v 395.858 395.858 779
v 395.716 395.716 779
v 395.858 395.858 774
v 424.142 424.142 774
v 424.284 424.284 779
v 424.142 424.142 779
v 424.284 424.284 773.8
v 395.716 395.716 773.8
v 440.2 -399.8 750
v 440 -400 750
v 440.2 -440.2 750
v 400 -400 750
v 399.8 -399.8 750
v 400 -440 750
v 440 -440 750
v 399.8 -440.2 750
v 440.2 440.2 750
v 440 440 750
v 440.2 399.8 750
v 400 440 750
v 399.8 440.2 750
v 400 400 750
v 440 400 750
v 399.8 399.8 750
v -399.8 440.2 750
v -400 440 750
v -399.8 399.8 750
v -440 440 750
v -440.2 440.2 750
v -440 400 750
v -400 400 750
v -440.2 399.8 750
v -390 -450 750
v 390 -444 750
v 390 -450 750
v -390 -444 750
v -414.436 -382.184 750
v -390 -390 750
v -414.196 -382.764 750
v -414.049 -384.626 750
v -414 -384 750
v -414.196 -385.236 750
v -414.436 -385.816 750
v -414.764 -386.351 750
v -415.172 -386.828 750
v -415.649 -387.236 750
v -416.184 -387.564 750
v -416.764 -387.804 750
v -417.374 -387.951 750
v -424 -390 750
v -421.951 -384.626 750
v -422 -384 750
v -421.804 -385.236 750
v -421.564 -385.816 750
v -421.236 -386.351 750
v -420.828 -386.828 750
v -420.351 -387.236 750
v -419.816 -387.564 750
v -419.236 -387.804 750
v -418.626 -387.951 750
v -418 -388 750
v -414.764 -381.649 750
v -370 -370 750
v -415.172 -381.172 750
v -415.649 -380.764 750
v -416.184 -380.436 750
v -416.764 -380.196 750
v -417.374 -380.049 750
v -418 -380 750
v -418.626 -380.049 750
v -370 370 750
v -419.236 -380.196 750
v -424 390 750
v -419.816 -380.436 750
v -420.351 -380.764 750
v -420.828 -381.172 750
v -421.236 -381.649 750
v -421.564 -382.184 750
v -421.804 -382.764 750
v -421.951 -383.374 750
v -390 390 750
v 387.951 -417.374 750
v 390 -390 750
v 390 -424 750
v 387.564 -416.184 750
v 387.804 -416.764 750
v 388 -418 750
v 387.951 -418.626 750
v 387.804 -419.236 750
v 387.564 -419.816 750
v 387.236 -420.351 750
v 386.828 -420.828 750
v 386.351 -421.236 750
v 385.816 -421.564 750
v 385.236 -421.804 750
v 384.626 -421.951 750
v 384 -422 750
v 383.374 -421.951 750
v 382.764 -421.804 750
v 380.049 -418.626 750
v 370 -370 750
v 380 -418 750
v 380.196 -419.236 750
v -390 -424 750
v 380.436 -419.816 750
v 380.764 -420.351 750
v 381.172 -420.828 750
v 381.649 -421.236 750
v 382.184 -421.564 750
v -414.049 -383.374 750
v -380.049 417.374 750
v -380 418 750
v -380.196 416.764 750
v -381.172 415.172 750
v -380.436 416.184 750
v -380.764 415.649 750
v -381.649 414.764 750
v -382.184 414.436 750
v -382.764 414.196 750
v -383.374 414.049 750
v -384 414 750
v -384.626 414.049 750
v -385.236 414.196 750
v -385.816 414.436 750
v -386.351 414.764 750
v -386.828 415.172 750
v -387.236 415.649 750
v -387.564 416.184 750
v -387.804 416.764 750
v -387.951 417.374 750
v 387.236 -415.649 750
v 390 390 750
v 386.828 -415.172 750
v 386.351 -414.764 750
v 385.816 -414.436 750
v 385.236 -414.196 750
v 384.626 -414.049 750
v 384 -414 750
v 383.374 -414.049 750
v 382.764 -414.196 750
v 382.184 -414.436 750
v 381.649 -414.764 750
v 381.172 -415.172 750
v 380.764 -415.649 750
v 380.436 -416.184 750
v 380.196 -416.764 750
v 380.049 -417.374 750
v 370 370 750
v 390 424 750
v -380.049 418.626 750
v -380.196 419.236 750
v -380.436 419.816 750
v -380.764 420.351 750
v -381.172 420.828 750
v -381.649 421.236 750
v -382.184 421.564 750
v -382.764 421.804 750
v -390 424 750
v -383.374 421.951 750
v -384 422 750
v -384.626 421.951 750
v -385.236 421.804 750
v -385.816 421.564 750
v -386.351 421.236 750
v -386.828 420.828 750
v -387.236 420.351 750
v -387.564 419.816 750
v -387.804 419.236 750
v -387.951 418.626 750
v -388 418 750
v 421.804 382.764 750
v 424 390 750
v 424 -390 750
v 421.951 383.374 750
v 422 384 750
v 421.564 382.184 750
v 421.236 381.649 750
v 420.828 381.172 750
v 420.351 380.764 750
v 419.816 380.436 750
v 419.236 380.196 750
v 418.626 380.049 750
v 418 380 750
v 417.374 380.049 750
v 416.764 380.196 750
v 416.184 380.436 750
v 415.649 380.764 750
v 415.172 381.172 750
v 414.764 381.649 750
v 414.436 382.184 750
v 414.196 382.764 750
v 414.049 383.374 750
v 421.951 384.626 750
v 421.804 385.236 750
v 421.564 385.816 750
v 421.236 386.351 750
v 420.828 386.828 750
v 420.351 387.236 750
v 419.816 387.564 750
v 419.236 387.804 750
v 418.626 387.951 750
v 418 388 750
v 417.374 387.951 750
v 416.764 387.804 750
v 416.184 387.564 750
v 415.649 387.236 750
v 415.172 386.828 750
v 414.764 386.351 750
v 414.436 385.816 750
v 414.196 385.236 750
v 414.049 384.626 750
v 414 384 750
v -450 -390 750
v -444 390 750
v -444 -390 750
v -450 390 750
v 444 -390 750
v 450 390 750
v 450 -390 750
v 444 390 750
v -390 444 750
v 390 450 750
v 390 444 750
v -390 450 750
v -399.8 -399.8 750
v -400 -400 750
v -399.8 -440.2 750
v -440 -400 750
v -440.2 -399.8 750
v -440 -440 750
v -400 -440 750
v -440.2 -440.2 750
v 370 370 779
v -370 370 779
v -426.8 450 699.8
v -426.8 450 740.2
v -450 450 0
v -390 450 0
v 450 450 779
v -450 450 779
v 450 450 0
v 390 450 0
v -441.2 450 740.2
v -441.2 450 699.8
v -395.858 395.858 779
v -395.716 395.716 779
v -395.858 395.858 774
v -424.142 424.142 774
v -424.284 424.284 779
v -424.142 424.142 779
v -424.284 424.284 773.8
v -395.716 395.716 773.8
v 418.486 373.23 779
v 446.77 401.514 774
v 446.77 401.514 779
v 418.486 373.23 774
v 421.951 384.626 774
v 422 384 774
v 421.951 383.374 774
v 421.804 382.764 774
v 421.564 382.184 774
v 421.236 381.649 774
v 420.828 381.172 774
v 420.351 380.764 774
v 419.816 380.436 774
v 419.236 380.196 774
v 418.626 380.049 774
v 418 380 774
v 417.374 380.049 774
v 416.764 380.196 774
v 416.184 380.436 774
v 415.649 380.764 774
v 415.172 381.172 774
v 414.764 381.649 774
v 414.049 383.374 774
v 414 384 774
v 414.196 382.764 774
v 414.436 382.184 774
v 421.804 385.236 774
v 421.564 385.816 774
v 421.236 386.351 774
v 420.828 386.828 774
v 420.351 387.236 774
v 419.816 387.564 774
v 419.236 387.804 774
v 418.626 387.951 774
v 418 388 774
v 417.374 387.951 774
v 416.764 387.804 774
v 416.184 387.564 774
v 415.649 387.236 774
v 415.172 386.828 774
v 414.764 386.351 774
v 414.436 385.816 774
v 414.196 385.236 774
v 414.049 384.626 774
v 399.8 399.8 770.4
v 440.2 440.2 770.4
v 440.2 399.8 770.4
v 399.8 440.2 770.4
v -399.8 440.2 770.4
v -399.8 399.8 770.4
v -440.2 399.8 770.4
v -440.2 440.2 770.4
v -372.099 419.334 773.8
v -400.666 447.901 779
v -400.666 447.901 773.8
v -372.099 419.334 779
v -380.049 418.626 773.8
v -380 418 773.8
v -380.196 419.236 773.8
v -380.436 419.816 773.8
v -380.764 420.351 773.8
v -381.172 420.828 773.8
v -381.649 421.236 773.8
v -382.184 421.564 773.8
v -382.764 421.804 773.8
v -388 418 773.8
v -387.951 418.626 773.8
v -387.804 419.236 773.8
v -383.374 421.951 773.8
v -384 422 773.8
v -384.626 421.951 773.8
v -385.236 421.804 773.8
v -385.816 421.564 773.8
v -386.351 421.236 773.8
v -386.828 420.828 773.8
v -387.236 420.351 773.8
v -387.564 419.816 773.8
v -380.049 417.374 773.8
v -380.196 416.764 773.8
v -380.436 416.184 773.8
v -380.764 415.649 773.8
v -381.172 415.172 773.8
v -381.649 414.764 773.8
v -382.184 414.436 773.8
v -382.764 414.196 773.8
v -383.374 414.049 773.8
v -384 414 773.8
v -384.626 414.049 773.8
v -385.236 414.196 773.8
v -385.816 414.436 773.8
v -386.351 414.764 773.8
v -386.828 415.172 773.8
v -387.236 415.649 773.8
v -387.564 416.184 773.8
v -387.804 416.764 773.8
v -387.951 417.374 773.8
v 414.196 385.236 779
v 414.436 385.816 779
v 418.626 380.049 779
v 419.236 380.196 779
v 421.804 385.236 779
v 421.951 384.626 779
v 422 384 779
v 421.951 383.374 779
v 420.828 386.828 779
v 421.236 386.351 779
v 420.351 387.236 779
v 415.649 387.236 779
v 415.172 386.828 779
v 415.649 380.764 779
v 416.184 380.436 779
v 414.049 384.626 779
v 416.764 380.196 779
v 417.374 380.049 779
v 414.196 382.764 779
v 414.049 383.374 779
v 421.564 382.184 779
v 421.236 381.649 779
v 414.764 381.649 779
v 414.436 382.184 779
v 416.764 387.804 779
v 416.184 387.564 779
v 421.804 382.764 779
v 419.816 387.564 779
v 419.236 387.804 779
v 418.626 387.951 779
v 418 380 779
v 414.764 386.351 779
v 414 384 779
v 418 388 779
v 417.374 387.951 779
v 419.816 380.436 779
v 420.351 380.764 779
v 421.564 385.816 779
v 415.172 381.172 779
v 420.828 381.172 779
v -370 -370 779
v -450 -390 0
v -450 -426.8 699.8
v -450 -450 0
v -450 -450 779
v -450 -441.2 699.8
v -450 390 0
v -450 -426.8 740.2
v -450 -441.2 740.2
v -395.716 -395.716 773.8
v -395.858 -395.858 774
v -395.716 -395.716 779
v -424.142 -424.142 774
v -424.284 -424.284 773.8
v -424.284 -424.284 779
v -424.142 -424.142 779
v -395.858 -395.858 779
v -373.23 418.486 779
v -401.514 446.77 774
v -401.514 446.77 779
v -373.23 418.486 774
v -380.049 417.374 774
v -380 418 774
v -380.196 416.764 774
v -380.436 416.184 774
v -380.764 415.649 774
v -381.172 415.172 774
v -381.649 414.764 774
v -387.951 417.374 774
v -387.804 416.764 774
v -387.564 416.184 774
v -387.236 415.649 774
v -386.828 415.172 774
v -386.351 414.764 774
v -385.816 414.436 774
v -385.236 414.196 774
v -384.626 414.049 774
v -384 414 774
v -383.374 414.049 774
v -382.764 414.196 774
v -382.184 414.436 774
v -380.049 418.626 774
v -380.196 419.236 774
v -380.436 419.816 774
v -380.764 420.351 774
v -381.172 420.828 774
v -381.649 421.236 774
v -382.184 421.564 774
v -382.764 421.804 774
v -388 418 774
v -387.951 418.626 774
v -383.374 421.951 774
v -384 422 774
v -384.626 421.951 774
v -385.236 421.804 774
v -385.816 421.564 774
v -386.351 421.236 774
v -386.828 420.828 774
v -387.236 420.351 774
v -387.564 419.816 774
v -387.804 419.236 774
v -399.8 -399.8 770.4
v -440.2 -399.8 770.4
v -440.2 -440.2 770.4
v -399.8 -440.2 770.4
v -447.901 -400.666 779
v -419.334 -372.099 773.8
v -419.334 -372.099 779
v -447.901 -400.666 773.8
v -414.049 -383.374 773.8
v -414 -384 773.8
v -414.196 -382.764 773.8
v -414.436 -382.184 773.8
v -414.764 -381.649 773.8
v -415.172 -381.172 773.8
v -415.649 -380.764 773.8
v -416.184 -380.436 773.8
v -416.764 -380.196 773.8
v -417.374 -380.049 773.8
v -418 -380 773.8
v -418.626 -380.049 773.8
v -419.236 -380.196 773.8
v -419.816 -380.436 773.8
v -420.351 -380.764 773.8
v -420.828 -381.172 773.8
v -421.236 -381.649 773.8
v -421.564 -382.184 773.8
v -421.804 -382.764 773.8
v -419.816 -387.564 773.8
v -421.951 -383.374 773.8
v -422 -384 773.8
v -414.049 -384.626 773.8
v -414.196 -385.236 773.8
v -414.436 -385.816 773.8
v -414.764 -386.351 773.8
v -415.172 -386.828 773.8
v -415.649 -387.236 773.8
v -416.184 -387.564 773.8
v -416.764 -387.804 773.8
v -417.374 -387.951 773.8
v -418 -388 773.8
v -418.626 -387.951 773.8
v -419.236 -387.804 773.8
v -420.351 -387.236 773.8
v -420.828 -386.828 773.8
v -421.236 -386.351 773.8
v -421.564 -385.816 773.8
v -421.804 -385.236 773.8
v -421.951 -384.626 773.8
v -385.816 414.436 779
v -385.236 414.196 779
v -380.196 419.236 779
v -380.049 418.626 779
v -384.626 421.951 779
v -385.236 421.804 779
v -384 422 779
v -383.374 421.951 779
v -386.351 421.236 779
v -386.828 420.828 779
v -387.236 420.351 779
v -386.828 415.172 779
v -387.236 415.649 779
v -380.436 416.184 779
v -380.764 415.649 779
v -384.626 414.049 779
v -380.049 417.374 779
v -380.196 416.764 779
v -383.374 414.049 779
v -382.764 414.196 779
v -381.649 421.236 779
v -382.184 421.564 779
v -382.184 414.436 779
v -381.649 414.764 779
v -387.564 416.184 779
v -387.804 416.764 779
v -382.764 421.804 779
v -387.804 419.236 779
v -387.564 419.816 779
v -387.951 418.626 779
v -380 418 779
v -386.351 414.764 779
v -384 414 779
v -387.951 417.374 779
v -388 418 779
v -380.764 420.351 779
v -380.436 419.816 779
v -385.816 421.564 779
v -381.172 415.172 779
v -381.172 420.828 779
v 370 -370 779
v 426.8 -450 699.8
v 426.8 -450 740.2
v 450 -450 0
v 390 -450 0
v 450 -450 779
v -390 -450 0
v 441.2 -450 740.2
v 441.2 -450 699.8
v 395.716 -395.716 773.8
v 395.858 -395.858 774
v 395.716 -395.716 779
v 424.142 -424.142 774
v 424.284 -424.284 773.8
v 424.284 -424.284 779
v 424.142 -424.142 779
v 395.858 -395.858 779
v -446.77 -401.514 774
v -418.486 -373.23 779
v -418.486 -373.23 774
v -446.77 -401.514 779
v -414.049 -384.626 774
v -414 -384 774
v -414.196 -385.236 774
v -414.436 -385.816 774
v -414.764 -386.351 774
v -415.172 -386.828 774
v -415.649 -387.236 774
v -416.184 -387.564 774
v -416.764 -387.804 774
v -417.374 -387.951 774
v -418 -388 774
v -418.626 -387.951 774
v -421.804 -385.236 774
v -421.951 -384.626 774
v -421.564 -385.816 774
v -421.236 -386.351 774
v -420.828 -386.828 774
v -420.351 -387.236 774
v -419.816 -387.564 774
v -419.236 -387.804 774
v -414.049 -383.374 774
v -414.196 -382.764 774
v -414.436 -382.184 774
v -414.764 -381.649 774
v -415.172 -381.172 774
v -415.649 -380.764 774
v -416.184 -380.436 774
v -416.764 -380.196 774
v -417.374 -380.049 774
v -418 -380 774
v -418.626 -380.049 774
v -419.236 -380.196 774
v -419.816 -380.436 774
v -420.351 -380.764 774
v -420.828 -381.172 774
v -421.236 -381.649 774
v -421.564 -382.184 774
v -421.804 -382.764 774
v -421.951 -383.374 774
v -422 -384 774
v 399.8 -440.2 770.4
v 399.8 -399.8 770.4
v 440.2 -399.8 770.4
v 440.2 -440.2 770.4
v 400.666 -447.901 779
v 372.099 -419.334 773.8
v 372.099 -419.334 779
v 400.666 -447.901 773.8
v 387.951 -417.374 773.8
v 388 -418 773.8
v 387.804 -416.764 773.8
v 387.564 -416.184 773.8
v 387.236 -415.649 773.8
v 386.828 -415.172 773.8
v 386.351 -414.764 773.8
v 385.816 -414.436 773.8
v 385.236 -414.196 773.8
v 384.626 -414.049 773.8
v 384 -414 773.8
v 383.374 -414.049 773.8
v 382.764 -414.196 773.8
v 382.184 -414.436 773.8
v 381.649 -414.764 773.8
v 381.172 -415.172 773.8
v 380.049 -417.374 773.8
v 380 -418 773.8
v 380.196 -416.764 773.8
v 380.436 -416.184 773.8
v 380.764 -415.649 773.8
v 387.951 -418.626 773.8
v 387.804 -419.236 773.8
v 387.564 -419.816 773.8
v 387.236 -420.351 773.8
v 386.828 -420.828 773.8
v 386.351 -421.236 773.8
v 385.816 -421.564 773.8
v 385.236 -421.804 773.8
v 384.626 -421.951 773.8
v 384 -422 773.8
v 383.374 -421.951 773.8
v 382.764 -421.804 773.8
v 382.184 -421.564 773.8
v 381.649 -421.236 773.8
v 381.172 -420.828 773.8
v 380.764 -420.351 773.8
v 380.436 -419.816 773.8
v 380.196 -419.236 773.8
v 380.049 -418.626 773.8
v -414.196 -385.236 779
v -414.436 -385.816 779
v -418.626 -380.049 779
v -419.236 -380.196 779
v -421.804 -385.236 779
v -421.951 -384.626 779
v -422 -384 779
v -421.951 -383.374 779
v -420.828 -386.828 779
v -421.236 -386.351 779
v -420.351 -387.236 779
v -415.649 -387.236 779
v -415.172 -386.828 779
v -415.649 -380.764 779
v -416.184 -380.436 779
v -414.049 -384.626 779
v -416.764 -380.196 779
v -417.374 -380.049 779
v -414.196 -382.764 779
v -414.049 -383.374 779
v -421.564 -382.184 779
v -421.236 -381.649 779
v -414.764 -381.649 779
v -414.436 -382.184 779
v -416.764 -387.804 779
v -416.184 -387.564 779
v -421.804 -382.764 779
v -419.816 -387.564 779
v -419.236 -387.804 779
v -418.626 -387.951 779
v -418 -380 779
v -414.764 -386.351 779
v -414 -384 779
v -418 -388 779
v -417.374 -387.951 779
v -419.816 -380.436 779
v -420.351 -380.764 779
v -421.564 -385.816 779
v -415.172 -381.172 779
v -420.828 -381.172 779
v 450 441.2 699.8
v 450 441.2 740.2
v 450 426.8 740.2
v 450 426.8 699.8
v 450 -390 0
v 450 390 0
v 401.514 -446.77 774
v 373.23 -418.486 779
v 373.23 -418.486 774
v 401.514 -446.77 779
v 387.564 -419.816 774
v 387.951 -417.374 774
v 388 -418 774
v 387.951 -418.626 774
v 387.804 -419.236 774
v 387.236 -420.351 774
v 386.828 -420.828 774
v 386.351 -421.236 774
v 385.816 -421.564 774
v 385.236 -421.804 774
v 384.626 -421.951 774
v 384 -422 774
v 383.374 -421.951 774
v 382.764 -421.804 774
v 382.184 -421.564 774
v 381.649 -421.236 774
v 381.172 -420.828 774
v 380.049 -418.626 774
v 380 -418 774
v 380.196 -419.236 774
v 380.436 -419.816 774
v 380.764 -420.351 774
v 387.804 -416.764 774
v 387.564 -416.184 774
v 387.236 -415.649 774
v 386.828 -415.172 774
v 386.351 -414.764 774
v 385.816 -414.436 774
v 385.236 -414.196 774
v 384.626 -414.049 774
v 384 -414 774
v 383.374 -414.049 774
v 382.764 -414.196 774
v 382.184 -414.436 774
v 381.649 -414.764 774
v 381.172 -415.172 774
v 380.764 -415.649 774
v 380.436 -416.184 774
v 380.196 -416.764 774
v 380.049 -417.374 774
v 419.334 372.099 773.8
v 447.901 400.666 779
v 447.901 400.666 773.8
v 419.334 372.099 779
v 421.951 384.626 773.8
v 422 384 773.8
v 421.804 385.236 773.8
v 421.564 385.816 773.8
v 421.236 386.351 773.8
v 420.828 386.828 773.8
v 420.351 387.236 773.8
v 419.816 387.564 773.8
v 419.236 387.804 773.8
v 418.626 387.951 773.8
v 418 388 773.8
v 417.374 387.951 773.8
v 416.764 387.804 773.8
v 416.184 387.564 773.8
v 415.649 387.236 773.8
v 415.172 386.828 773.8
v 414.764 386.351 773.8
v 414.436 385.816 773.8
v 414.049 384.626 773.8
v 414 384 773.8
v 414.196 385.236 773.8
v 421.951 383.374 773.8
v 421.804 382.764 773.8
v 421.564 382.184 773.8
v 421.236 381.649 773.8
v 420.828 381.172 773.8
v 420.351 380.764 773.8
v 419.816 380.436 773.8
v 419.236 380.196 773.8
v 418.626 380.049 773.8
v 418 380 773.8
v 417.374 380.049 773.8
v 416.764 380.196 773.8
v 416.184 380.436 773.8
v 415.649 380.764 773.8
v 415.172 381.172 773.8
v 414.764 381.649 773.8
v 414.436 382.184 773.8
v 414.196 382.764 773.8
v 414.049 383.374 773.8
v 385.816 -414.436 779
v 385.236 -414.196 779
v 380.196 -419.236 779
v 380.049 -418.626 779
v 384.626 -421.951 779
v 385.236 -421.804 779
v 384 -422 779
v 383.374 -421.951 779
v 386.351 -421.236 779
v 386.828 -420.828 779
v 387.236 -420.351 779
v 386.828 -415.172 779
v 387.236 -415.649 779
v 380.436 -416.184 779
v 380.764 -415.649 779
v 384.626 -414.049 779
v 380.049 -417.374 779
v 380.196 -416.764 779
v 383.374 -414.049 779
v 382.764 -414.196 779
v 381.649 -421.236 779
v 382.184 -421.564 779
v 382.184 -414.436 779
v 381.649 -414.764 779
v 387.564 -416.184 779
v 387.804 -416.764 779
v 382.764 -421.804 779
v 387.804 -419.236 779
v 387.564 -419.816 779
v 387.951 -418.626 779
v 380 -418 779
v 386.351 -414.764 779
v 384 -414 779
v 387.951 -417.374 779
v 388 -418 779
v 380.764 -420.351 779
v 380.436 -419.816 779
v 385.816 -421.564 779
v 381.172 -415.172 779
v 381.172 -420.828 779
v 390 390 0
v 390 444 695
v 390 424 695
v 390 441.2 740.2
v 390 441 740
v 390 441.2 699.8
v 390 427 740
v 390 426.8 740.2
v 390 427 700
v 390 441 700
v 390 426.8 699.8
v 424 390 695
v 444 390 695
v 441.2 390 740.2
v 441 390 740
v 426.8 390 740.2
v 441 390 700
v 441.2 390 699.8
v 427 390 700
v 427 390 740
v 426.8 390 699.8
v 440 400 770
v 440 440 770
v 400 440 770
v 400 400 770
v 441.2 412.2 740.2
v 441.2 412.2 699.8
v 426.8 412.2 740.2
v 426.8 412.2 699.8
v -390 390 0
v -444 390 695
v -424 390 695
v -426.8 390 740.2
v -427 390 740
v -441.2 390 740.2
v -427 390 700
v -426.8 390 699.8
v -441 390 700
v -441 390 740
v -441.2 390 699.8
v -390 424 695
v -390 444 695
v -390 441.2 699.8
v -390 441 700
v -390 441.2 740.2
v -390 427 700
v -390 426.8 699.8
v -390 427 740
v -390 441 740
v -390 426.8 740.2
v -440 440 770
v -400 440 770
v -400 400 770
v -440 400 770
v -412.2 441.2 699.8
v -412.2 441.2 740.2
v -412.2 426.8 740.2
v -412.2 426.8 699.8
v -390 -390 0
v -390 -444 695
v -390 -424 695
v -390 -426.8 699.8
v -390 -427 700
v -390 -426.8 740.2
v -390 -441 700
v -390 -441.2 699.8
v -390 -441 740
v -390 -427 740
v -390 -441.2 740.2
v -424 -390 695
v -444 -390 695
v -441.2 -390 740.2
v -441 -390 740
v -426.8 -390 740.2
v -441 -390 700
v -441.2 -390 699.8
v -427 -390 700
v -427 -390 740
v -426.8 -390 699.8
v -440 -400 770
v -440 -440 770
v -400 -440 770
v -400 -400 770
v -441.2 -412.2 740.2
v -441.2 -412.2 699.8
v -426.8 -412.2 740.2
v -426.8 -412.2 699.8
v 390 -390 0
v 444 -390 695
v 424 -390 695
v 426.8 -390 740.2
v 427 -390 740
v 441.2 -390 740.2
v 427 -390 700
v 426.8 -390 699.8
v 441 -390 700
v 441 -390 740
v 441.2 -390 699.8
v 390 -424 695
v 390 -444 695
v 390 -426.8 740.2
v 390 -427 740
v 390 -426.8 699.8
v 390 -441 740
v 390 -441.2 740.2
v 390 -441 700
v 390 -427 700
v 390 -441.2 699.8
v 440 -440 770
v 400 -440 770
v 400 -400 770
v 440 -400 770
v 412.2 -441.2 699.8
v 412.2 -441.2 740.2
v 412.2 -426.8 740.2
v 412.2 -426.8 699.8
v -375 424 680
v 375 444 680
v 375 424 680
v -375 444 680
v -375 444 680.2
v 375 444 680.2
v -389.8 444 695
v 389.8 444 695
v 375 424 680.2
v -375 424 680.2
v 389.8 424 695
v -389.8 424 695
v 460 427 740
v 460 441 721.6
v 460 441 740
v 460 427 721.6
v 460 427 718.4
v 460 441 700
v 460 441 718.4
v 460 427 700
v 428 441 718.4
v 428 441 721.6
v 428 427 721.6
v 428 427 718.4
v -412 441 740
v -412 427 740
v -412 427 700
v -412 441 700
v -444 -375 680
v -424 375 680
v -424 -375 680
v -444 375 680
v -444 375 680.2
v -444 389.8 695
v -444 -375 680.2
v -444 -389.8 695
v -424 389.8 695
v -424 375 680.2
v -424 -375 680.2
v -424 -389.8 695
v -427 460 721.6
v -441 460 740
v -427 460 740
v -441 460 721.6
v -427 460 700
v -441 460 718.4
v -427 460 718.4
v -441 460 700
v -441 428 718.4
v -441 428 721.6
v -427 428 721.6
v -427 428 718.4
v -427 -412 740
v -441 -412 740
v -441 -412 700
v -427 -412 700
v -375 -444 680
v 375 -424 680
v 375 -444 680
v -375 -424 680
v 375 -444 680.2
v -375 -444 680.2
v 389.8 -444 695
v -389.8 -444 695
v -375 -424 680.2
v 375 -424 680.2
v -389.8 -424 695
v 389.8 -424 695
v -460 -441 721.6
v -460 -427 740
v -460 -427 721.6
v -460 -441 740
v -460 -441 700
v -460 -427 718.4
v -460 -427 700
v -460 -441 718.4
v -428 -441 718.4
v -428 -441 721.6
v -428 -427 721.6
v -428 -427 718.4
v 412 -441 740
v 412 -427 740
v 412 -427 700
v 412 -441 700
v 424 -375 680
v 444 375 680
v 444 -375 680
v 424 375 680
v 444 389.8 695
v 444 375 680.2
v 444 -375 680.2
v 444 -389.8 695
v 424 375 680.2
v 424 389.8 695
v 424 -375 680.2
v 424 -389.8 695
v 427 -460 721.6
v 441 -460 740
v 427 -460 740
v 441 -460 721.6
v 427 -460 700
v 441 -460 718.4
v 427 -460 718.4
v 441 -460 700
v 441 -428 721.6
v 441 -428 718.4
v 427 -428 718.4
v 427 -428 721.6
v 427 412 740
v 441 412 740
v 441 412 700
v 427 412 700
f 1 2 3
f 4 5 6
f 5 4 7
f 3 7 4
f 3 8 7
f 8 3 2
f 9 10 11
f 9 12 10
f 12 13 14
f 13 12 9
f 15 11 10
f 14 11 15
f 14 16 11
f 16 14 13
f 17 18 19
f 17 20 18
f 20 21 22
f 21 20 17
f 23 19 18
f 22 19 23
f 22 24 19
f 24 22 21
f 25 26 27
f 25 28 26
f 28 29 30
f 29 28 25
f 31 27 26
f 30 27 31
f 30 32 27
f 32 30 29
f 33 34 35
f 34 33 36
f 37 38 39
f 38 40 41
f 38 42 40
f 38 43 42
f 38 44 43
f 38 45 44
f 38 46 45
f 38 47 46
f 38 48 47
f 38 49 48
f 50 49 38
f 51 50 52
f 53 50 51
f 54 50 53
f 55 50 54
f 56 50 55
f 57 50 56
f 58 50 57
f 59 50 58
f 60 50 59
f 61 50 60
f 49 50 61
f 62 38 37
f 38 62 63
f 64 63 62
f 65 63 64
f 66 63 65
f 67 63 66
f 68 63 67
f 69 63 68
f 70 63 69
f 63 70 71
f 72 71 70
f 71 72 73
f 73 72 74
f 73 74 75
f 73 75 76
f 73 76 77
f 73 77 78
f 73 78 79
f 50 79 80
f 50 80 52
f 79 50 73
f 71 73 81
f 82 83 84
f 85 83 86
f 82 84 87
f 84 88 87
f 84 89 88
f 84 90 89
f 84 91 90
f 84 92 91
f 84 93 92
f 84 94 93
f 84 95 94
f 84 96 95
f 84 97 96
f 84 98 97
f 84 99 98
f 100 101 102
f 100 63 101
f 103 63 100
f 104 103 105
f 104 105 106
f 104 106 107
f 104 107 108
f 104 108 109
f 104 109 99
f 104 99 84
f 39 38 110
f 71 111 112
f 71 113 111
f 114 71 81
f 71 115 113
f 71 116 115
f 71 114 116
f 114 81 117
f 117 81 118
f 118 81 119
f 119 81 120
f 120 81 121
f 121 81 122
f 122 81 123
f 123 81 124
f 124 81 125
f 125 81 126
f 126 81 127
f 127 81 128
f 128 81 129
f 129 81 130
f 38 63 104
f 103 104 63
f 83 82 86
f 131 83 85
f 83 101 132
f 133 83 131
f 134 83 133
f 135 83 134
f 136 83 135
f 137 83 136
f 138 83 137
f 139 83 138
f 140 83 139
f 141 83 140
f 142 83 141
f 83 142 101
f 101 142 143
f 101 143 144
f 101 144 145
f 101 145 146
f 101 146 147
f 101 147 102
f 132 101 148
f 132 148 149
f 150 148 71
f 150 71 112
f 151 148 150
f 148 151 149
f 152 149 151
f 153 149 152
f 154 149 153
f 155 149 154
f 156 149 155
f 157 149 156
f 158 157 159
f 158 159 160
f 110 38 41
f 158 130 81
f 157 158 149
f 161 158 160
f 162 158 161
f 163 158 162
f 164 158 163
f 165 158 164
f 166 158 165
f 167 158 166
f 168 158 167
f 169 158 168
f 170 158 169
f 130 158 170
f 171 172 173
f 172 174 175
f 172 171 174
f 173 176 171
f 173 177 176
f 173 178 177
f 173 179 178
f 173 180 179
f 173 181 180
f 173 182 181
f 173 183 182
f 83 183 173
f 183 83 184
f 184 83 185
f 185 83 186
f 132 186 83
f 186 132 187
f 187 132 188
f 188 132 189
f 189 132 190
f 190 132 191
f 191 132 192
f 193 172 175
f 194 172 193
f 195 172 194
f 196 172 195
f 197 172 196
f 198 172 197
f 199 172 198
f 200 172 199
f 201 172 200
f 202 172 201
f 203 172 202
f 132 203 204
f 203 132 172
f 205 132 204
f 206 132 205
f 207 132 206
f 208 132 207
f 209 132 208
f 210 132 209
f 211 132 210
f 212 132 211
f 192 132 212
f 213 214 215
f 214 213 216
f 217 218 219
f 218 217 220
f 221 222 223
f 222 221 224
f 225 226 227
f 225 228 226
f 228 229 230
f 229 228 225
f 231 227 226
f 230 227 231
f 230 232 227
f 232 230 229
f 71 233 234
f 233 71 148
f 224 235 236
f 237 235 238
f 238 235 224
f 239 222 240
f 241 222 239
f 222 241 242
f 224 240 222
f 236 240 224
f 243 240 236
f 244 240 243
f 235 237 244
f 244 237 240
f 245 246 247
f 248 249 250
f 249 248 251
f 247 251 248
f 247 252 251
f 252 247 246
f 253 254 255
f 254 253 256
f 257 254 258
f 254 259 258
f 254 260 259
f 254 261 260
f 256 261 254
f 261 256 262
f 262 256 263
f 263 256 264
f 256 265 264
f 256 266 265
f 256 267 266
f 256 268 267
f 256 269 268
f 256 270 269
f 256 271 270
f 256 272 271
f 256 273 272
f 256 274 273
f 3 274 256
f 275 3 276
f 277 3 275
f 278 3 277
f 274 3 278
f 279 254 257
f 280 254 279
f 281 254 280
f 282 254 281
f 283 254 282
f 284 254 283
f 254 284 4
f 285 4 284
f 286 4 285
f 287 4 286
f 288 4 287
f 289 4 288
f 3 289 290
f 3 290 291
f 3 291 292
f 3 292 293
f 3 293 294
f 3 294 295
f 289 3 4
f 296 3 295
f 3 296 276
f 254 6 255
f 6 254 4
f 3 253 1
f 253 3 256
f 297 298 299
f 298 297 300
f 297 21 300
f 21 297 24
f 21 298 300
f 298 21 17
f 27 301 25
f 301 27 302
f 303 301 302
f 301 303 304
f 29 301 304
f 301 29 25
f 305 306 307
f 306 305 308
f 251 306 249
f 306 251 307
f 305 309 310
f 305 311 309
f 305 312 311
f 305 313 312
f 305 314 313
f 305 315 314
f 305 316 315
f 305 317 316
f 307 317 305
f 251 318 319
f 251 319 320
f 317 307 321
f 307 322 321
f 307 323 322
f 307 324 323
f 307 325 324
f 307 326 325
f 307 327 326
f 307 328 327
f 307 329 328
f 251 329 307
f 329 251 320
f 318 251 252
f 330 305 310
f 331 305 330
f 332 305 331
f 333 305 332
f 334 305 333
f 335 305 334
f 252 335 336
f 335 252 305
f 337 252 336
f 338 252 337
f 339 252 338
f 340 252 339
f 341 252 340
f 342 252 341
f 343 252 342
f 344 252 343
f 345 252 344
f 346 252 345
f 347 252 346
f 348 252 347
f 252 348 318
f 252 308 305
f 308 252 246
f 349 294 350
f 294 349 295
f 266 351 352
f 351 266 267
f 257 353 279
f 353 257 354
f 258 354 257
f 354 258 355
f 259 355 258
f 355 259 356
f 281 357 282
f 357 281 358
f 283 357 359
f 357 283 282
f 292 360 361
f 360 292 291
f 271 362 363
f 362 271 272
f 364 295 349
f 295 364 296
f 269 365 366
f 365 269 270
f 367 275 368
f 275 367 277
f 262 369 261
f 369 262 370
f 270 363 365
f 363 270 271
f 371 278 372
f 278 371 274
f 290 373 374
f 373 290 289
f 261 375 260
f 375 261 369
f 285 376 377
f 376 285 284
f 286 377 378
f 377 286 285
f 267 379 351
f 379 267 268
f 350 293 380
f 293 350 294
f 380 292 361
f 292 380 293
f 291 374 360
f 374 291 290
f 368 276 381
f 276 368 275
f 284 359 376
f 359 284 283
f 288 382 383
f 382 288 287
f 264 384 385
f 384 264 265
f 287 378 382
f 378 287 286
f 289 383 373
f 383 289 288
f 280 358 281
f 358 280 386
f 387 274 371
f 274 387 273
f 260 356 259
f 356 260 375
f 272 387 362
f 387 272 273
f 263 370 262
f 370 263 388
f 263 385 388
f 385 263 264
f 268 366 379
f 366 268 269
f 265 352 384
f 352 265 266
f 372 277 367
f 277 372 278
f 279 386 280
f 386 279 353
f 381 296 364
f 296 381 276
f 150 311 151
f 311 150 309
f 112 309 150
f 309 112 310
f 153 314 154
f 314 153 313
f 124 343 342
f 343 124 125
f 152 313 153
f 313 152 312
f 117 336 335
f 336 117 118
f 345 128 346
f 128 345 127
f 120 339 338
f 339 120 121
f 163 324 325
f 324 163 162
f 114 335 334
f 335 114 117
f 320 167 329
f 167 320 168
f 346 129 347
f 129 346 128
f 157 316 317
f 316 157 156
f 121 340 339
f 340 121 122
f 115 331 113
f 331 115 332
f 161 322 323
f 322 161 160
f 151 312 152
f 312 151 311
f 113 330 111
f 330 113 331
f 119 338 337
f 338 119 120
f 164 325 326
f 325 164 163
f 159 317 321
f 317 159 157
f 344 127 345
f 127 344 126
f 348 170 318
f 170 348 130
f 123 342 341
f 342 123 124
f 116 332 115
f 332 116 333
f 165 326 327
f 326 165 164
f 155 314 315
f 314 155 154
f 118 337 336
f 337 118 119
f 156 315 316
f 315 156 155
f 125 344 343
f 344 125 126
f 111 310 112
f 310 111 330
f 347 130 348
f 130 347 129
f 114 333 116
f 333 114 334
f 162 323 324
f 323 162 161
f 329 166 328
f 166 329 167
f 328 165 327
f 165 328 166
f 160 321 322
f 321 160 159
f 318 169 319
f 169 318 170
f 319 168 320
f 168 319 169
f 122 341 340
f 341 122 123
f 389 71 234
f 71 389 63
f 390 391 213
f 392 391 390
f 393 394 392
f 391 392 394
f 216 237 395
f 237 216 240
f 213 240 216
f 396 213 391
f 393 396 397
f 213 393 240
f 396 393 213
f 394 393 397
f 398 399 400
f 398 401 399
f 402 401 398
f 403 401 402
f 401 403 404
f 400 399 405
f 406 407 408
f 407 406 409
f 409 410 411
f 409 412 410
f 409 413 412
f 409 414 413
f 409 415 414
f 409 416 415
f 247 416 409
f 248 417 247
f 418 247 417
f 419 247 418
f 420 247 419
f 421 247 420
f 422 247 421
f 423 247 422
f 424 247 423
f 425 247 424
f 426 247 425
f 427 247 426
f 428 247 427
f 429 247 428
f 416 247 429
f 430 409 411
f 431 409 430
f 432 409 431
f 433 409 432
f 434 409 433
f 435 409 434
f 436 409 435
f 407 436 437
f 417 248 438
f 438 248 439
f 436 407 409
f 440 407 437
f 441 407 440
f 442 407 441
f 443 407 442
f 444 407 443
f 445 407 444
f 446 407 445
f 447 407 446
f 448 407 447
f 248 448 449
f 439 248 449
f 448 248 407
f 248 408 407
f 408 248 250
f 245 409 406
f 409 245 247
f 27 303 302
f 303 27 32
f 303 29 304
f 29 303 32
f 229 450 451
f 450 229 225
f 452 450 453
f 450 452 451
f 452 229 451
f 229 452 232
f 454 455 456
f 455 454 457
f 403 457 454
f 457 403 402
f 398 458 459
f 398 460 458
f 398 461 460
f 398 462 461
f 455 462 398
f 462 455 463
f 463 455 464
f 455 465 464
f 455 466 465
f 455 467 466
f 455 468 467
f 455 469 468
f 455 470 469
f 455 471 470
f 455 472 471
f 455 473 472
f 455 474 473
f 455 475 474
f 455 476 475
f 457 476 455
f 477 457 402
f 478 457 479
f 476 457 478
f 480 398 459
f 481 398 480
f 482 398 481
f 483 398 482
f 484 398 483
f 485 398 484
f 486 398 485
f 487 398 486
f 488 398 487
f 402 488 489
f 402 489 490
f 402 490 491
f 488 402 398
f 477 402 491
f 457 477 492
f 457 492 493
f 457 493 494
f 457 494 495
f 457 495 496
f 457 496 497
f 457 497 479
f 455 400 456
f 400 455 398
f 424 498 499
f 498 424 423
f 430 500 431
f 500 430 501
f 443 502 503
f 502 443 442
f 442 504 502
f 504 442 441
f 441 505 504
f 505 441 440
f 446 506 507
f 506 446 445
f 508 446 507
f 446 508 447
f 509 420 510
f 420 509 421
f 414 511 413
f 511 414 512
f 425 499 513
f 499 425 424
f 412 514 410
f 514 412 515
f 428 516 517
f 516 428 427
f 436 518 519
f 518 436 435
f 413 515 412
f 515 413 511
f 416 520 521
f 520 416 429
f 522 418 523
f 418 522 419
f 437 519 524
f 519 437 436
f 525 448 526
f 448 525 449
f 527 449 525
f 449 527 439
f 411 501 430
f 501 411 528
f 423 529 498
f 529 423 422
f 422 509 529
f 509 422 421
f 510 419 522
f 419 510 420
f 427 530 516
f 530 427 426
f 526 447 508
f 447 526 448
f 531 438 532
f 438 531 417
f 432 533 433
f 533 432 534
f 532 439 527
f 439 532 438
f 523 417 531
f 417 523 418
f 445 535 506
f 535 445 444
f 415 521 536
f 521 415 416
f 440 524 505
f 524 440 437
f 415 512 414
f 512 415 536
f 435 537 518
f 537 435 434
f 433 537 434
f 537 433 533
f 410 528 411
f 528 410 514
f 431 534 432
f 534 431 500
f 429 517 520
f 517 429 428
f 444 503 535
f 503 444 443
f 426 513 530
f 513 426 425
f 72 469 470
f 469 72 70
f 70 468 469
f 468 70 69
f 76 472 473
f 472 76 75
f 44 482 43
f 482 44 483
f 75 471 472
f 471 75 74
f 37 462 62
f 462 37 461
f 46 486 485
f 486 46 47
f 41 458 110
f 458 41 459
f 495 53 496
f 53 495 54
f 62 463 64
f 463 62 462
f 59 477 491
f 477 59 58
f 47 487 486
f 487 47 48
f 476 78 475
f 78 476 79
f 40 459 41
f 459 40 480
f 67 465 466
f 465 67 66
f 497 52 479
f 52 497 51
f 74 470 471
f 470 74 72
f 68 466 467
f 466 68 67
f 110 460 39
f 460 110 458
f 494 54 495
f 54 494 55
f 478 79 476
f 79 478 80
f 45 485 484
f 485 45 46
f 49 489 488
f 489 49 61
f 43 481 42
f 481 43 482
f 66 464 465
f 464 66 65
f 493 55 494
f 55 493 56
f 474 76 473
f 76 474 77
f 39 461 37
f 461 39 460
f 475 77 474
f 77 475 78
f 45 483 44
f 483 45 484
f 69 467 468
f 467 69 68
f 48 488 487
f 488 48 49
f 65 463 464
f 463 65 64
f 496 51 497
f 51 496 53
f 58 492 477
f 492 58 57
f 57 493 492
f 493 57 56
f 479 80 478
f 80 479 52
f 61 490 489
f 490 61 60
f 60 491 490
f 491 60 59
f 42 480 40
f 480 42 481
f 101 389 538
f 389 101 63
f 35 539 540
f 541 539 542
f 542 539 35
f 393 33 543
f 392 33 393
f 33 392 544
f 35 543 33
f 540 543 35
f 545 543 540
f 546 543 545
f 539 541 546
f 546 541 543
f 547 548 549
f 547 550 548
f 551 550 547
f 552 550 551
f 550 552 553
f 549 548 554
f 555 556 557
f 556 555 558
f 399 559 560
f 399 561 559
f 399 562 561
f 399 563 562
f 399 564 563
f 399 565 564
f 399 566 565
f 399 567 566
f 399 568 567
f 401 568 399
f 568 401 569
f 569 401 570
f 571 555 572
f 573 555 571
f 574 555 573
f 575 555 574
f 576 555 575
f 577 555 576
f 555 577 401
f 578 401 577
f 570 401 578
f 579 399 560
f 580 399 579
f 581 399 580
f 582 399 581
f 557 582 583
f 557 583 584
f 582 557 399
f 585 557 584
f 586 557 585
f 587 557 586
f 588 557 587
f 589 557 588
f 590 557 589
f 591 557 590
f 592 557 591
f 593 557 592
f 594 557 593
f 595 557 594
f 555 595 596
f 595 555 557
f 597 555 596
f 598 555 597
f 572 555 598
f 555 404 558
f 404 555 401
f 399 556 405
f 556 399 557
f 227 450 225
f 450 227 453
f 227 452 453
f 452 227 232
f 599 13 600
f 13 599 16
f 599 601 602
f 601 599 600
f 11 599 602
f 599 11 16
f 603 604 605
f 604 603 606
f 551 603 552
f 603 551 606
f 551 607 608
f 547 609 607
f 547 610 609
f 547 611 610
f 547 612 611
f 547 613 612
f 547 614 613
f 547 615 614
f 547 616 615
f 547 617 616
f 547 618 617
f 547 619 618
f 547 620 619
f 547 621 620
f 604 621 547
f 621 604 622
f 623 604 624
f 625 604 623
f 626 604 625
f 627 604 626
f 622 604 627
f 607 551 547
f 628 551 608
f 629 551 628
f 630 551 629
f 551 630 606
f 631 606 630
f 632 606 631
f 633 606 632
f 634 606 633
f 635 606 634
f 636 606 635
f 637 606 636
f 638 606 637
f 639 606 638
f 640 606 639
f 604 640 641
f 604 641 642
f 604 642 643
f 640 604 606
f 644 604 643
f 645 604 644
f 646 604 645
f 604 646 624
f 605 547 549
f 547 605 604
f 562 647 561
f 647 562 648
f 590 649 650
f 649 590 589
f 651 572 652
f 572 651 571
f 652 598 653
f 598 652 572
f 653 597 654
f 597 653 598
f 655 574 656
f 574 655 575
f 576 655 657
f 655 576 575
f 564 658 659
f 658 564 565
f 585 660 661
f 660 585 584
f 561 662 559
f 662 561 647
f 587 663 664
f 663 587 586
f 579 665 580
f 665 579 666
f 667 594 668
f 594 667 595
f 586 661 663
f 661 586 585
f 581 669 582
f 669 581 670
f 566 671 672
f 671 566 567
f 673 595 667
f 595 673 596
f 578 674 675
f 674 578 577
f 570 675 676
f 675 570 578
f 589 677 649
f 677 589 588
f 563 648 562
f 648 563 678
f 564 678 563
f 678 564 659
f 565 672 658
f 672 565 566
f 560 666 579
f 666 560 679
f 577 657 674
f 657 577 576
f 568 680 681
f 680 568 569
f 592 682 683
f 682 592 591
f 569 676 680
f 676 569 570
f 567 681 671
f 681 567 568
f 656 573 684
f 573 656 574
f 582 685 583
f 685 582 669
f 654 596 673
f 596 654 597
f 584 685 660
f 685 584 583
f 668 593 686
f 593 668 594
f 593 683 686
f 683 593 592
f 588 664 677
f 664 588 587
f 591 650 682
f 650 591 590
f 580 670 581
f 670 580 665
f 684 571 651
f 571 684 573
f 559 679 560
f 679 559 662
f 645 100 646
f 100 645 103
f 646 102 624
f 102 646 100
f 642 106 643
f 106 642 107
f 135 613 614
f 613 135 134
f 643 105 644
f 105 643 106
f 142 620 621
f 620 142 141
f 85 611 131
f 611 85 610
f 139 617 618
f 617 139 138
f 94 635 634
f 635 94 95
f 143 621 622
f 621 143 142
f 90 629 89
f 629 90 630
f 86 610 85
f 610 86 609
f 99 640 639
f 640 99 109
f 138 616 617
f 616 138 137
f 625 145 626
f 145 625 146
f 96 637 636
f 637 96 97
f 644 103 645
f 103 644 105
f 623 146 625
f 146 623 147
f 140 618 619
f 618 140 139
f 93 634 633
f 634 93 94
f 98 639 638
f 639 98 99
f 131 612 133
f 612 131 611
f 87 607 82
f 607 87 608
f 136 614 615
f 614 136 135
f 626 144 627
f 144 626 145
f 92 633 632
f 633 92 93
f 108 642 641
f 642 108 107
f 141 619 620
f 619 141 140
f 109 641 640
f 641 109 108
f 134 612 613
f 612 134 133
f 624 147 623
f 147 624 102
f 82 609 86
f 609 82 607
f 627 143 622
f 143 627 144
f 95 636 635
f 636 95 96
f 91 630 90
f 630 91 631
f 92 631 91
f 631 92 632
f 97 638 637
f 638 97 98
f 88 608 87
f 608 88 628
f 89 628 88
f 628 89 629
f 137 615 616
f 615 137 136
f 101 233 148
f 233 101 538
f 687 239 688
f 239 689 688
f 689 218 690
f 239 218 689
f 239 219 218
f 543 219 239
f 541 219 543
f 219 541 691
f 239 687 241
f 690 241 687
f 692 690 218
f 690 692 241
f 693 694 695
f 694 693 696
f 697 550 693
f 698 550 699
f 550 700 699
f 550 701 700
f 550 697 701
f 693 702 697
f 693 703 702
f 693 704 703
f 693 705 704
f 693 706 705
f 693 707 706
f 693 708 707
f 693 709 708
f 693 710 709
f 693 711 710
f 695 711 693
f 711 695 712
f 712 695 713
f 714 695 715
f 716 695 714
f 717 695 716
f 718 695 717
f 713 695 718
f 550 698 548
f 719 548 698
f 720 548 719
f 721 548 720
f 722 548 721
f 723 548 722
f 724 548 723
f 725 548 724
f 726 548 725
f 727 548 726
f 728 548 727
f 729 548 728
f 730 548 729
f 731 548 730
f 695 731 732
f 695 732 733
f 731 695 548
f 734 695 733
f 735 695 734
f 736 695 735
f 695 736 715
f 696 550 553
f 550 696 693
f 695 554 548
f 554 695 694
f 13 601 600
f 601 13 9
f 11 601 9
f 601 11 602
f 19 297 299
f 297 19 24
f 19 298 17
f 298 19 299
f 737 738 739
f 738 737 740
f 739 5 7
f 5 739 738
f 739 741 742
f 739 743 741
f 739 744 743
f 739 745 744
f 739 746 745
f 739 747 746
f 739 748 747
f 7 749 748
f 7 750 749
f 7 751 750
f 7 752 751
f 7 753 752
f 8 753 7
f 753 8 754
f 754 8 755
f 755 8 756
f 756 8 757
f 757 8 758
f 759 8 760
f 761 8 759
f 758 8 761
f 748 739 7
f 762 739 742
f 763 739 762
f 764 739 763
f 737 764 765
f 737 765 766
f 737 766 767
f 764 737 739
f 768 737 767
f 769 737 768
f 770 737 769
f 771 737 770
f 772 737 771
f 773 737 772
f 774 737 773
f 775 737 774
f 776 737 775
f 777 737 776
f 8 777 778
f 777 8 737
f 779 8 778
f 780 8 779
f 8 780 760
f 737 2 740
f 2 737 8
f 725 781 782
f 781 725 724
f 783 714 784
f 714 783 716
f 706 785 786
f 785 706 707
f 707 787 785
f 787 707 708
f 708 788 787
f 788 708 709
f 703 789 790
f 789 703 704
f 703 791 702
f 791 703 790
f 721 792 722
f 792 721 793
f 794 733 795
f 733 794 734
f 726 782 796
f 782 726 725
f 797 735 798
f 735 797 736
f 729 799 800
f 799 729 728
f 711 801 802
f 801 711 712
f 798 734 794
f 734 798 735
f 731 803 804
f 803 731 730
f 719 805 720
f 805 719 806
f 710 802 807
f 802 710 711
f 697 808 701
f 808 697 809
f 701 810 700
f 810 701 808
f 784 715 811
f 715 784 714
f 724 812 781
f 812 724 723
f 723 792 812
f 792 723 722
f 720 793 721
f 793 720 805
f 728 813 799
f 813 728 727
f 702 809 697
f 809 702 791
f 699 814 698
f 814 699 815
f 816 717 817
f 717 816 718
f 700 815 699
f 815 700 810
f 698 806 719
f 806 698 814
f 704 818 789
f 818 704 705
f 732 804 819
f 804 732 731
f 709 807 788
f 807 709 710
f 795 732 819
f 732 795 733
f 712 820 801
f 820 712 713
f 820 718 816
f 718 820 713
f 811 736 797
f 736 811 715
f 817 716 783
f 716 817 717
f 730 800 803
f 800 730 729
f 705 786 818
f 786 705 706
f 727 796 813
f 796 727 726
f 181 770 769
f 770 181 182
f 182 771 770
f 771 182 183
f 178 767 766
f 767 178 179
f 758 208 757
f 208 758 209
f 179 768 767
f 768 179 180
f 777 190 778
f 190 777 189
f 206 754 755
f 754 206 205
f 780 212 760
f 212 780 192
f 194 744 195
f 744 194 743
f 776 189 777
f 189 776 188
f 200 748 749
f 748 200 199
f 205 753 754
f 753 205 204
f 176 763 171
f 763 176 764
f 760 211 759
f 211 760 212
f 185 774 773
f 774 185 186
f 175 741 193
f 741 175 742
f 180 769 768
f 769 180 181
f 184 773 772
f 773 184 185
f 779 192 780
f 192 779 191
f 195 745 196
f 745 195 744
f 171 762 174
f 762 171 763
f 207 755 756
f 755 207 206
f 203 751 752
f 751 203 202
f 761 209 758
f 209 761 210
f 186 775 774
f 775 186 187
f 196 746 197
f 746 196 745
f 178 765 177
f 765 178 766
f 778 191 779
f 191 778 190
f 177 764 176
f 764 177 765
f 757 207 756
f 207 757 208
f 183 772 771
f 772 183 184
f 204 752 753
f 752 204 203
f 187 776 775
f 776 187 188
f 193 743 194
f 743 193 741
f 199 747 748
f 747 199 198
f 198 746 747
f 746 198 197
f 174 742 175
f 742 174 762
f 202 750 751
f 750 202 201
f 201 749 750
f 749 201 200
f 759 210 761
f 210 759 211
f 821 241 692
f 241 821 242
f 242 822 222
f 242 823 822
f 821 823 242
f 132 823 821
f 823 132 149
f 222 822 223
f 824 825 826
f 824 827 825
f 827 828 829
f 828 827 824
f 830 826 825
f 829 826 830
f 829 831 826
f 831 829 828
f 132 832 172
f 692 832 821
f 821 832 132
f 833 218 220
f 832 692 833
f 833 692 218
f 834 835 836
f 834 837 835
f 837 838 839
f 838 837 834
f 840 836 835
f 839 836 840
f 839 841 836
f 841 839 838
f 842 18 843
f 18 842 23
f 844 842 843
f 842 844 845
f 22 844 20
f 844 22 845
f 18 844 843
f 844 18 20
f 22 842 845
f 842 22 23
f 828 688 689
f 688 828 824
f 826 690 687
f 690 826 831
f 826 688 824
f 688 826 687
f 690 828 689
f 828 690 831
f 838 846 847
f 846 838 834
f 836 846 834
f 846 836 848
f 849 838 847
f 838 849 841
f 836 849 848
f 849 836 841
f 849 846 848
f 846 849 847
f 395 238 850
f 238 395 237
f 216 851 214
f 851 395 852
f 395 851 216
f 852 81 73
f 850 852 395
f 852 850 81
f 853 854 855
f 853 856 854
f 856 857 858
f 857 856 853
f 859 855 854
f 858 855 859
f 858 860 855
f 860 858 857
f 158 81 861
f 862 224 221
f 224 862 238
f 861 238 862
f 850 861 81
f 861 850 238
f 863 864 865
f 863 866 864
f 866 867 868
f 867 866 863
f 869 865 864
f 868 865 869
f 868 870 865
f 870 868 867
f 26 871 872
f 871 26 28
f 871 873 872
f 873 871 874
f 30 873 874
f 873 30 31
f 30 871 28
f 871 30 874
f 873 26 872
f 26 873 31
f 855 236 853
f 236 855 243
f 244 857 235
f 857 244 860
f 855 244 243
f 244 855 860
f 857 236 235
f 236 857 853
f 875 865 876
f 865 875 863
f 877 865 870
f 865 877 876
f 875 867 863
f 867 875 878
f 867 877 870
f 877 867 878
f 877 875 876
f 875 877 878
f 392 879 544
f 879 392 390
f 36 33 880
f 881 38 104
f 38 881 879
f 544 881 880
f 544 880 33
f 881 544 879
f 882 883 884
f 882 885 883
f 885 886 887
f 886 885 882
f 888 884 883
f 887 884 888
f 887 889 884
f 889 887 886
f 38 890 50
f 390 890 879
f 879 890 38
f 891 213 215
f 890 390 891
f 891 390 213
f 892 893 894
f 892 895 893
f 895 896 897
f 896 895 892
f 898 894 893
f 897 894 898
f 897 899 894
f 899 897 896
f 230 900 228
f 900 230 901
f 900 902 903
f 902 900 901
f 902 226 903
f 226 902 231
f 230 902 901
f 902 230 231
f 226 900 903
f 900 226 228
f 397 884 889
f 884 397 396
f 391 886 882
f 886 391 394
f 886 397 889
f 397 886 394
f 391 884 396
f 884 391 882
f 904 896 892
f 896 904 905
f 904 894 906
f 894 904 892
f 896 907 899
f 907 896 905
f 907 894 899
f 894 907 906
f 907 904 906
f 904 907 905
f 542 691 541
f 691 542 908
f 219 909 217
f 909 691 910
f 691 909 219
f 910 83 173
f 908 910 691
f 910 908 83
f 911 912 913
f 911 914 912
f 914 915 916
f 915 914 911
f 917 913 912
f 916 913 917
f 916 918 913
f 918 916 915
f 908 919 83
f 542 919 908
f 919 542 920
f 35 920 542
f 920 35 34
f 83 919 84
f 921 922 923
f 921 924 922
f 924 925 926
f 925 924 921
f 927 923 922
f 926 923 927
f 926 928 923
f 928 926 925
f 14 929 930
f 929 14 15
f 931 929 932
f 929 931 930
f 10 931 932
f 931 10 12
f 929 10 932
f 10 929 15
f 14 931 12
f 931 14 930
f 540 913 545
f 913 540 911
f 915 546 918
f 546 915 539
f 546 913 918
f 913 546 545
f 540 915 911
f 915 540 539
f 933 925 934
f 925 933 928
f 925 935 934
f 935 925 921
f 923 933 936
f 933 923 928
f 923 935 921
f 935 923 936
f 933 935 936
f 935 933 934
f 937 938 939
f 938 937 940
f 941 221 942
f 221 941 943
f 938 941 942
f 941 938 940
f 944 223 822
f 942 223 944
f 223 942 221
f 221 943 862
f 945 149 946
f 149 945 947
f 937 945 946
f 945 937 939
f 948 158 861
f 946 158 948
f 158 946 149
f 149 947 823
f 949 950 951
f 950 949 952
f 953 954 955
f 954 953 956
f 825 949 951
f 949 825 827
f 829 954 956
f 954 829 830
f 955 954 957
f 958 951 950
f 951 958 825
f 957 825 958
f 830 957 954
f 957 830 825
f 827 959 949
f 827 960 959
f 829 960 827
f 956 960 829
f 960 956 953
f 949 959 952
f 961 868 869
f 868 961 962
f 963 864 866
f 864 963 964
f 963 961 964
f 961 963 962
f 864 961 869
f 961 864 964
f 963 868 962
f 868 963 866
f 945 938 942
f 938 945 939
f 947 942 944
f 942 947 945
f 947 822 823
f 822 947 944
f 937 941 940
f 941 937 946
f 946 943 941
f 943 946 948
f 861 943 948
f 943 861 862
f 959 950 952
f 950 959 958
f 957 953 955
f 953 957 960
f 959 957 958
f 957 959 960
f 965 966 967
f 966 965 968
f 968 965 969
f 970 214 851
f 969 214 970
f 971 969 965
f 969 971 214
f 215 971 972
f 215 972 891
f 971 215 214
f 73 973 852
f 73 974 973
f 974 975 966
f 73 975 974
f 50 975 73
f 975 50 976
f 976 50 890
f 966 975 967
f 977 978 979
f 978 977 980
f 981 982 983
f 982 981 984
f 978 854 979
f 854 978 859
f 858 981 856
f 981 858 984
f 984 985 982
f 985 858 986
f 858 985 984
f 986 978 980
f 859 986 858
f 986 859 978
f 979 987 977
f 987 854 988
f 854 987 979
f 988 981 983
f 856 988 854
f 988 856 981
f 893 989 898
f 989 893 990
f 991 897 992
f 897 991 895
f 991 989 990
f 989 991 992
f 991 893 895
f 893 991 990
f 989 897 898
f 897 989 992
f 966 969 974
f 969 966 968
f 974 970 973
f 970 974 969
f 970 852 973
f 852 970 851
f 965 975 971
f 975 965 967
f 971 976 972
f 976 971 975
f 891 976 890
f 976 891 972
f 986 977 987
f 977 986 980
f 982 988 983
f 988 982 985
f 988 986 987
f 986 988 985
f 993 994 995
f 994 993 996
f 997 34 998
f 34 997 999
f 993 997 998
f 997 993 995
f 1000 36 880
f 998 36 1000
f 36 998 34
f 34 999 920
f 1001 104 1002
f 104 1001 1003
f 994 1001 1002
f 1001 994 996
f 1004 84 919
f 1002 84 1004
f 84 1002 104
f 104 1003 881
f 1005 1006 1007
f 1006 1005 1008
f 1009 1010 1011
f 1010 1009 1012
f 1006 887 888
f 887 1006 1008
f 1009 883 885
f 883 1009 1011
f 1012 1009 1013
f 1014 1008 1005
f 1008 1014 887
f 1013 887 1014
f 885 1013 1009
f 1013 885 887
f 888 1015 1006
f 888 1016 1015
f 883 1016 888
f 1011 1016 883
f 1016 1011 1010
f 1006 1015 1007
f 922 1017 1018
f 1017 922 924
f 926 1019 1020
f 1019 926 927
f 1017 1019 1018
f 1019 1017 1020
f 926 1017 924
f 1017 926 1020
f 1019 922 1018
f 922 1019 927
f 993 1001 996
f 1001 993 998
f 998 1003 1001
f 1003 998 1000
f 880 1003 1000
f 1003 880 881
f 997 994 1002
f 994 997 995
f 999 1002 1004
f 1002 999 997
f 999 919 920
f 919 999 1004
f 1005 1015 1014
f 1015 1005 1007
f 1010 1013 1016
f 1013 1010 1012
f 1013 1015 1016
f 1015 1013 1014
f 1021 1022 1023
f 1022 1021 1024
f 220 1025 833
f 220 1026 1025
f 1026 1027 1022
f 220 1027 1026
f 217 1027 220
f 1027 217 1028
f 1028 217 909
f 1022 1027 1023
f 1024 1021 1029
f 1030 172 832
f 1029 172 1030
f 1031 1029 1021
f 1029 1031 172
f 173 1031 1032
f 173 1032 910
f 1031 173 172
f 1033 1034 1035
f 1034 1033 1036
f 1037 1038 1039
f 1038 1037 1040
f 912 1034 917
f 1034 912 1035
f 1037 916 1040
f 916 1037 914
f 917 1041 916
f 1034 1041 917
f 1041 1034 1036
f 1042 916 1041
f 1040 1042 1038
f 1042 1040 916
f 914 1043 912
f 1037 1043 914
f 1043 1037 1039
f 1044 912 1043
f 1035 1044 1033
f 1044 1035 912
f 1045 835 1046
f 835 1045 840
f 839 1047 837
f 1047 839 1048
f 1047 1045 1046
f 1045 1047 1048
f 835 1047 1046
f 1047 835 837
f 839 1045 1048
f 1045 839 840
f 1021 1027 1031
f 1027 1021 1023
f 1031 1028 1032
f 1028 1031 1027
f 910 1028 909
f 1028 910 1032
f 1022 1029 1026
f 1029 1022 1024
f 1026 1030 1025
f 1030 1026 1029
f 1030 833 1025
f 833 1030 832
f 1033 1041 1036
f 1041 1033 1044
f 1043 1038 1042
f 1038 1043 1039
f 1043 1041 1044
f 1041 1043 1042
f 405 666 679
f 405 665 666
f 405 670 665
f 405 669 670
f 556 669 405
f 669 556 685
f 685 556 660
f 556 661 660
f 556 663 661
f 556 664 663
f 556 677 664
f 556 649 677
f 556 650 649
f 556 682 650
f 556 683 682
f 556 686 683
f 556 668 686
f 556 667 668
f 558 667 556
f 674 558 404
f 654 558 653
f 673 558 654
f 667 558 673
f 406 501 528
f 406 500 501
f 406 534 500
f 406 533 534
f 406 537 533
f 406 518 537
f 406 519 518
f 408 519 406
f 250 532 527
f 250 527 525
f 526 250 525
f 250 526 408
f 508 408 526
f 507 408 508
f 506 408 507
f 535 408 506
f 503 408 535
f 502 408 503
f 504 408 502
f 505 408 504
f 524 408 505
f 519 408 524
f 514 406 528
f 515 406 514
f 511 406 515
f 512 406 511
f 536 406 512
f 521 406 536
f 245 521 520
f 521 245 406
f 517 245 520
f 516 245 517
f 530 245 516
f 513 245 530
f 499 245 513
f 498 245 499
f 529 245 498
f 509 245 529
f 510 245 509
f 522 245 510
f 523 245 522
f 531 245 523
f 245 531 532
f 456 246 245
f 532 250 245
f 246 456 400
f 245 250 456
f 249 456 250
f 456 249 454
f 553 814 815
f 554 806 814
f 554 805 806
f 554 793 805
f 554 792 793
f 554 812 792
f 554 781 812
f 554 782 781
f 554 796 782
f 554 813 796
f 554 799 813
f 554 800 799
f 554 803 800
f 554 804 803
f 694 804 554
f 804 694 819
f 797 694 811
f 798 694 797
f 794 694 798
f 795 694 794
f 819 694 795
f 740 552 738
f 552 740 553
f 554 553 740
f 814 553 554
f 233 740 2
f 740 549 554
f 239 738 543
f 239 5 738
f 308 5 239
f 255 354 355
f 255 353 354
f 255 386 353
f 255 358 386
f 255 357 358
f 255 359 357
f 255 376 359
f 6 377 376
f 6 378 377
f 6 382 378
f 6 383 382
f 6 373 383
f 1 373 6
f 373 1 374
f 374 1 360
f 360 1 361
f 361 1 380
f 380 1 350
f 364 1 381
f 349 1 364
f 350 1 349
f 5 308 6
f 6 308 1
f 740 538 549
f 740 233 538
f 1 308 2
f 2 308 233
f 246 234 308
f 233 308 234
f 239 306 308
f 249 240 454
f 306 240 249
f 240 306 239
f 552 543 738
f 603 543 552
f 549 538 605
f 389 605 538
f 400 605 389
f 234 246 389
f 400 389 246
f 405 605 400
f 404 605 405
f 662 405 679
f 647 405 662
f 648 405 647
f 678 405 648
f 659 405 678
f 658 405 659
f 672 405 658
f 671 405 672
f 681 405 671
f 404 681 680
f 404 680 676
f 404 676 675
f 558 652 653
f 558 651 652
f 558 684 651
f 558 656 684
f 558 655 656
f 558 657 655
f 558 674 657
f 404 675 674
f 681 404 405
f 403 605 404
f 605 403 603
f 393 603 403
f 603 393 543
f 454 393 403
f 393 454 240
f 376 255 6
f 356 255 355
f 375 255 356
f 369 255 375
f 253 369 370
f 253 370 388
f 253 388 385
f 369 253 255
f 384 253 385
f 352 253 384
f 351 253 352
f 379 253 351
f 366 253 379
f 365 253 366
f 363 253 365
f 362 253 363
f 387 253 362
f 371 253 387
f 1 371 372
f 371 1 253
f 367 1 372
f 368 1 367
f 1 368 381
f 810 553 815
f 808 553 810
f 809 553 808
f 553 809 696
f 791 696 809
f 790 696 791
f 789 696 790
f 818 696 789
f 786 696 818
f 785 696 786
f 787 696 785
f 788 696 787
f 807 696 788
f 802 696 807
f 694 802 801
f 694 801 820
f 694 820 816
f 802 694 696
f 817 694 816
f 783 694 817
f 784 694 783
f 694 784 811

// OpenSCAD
// file: parts.scad
$fn=40;

// ---- 桌腿 ----

module leg(){
  difference(){
    union(){
      translate([390.000,390.000,0.000]) cube([60.000,60.000,750.000]);
      translate([400.000,400.000,750.000]) cube([40.000,40.000,20.000]);
    }
    // 牙板透榫槽（沿 +x，+y 侧牙板 A 端穿入）
    translate([389.000,426.800,699.800]) cube([62.000,14.400,40.400]);
    // 牙板闷榫槽（沿 +y，+x 侧牙板 B 端）
    translate([426.800,389.000,699.800]) cube([14.400,23.200,40.400]);
  }
}

// ---- 边框 ----

module rail(){
  difference(){
    union(){
      translate([0,0,750]) linear_extrude(height=50) polygon(points=[[-370,370],[370,370],[450.0,450.0],[-450.0,450.0]]);
      translate([420.607,399.393,779.0]) rotate([0,0,-45]) cube([34,40,10],center=true);
    }
    // 面板槽：全长开通至 45° 端面（角部两框的槽合起来成 L 形）
    translate([-450.000,370.000,785.800]) cube([900.000,14.000,6.400]);
    // 腿顶榫卯（两端各半，合起来 40x40x20）
    translate([399.800,399.800,750.000]) cube([40.400,40.400,20.400]);
    translate([-440.200,399.800,750.000]) cube([40.400,40.400,20.400]);
    // 格角暗榫卯
    translate([-398.545,421.455,779.0]) rotate([0,0,45]) cube([34.4,40.4,10.4],center=true);
    // 竹销孔：+x 端穿暗榫，-x 端穿本体
    translate([418,384,750]) cylinder(h=34,r=4.0,$fn=40);
    translate([-384,418,750]) cylinder(h=34,r=4.0,$fn=40);
  }
}

// ---- 牙板 ----

module apron(){
  difference(){
    union(){
      translate([-390.000,424.000,680.000]) cube([780.000,20.000,70.000]);
      // A 端：透榫（390..460）
      translate([390.000,427.000,700.000]) cube([70.000,14.000,40.000]);
      // B 端：闷榫（-412..-390）
      translate([-412.000,427.000,700.000]) cube([22.000,14.000,40.000]);
    }
    hull(){ translate([375.000,423.500,680.000]) cube([15.000,21.000,0.200]); translate([389.800,423.500,680.000]) cube([0.200,21.000,15.000]); }
    hull(){ translate([-390.000,423.500,680.000]) cube([15.000,21.000,0.200]); translate([-390.000,423.500,680.000]) cube([0.200,21.000,15.000]); }
    // 透榫楔槽（横槽，撑开榫头上下两片）
    translate([428.000,426.900,718.400]) cube([32.200,14.200,3.200]);
  }
}

// ---- 面板-边板 ----

module panel_outer(){
  difference(){
    union(){
      translate([-365.000,-365.000,778.000]) cube([730.000,244.000,22.000]);
      translate([0,0,786]) linear_extrude(height=6) polygon(points=[[-379,-121],[-379,-377],[-377,-379],[377,-379],[379,-377],[379,-121],[365,-121],[365,-365],[-365,-365],[-365,-121]]);
    }
    // 内侧龙凤榫槽（向板内 8 深：y -129..-121）
    translate([-365.000,-129.000,785.800]) cube([730.000,8.000,6.400]);
    // 穿带燕尾槽
    hull(){ translate([-259.200,-365.000,778.000]) cube([30.400,244.000,0.100]); translate([-266.200,-365.000,783.900]) cube([44.400,244.000,0.100]); }
    hull(){ translate([-15.200,-365.000,778.000]) cube([30.400,244.000,0.100]); translate([-22.200,-365.000,783.900]) cube([44.400,244.000,0.100]); }
    hull(){ translate([228.800,-365.000,778.000]) cube([30.400,244.000,0.100]); translate([221.800,-365.000,783.900]) cube([44.400,244.000,0.100]); }
  }
}

// ---- 面板-中板 ----

module panel_middle(){
  difference(){
    union(){
      translate([-365.000,-121.000,778.000]) cube([730.000,242.000,22.000]);
      translate([365.000,-121.000,786.000]) cube([14.000,242.000,6.000]);
      translate([-379.000,-121.000,786.000]) cube([14.000,242.000,6.000]);
    }
    // 两侧龙凤榫槽（各向板内 8 深）
    translate([-365.000,-121.000,785.800]) cube([730.000,8.000,6.400]);
    translate([-365.000,113.000,785.800]) cube([730.000,8.000,6.400]);
    hull(){ translate([-259.200,-121.000,778.000]) cube([30.400,242.000,0.100]); translate([-266.200,-121.000,783.900]) cube([44.400,242.000,0.100]); }
    hull(){ translate([-15.200,-121.000,778.000]) cube([30.400,242.000,0.100]); translate([-22.200,-121.000,783.900]) cube([44.400,242.000,0.100]); }
    hull(){ translate([228.800,-121.000,778.000]) cube([30.400,242.000,0.100]); translate([221.800,-121.000,783.900]) cube([44.400,242.000,0.100]); }
  }
}

// ---- 穿带 ----

module cleat(){
  union(){
    translate([-20.000,-363.000,752.000]) cube([40.000,726.000,26.000]);
    hull(){
      translate([-15.000,-363.000,777.900]) cube([30.000,726.000,0.050]);
      translate([-22.000,-363.000,783.800]) cube([44.000,726.000,0.100]);
    }
  }
}

// ---- 穿簧 ----
module spline(){ translate([-360.000,-7.800,786.100]) cube([720.000,15.600,5.800]); }
// ---- 木楔 ----
module wedge(){ hull(){ translate([435.000,427.400,719.400]) cube([1.000,13.200,1.200]); translate([467.000,427.400,718.500]) cube([1.000,13.200,3.000]); } }
// ---- 竹销 ----
module pin(){ translate([0,0,750]) cylinder(h=34,r=4.0,$fn=40); }
// main file
include <parts.scad>
difference(){
 union(){
color([0.54,0.37,0.21]) translate([0,0,0]) rotate([0,0,0]) rail();color([0.54,0.37,0.21]) translate([0,0,0]) rotate([0,0,90]) rail();color([0.54,0.37,0.21]) translate([0,0,0]) rotate([0,0,180]) rail();color([0.54,0.37,0.21]) translate([0,0,0]) rotate([0,0,270]) rail();color([0.42,0.28,0.16]) translate([0,0,0]) rotate([0,0,0]) leg();color([0.42,0.28,0.16]) translate([0,0,0]) rotate([0,0,90]) leg();color([0.42,0.28,0.16]) translate([0,0,0]) rotate([0,0,180]) leg();color([0.42,0.28,0.16]) translate([0,0,0]) rotate([0,0,270]) leg();color([0.49,0.33,0.19]) translate([0,0,0]) rotate([0,0,0]) apron();color([0.49,0.33,0.19]) translate([0,0,0]) rotate([0,0,90]) apron();color([0.49,0.33,0.19]) translate([0,0,0]) rotate([0,0,180]) apron();color([0.49,0.33,0.19]) translate([0,0,0]) rotate([0,0,270]) apron();
 }
 translate([-600,-600,779]) cube([1200,1200,400]);
}
